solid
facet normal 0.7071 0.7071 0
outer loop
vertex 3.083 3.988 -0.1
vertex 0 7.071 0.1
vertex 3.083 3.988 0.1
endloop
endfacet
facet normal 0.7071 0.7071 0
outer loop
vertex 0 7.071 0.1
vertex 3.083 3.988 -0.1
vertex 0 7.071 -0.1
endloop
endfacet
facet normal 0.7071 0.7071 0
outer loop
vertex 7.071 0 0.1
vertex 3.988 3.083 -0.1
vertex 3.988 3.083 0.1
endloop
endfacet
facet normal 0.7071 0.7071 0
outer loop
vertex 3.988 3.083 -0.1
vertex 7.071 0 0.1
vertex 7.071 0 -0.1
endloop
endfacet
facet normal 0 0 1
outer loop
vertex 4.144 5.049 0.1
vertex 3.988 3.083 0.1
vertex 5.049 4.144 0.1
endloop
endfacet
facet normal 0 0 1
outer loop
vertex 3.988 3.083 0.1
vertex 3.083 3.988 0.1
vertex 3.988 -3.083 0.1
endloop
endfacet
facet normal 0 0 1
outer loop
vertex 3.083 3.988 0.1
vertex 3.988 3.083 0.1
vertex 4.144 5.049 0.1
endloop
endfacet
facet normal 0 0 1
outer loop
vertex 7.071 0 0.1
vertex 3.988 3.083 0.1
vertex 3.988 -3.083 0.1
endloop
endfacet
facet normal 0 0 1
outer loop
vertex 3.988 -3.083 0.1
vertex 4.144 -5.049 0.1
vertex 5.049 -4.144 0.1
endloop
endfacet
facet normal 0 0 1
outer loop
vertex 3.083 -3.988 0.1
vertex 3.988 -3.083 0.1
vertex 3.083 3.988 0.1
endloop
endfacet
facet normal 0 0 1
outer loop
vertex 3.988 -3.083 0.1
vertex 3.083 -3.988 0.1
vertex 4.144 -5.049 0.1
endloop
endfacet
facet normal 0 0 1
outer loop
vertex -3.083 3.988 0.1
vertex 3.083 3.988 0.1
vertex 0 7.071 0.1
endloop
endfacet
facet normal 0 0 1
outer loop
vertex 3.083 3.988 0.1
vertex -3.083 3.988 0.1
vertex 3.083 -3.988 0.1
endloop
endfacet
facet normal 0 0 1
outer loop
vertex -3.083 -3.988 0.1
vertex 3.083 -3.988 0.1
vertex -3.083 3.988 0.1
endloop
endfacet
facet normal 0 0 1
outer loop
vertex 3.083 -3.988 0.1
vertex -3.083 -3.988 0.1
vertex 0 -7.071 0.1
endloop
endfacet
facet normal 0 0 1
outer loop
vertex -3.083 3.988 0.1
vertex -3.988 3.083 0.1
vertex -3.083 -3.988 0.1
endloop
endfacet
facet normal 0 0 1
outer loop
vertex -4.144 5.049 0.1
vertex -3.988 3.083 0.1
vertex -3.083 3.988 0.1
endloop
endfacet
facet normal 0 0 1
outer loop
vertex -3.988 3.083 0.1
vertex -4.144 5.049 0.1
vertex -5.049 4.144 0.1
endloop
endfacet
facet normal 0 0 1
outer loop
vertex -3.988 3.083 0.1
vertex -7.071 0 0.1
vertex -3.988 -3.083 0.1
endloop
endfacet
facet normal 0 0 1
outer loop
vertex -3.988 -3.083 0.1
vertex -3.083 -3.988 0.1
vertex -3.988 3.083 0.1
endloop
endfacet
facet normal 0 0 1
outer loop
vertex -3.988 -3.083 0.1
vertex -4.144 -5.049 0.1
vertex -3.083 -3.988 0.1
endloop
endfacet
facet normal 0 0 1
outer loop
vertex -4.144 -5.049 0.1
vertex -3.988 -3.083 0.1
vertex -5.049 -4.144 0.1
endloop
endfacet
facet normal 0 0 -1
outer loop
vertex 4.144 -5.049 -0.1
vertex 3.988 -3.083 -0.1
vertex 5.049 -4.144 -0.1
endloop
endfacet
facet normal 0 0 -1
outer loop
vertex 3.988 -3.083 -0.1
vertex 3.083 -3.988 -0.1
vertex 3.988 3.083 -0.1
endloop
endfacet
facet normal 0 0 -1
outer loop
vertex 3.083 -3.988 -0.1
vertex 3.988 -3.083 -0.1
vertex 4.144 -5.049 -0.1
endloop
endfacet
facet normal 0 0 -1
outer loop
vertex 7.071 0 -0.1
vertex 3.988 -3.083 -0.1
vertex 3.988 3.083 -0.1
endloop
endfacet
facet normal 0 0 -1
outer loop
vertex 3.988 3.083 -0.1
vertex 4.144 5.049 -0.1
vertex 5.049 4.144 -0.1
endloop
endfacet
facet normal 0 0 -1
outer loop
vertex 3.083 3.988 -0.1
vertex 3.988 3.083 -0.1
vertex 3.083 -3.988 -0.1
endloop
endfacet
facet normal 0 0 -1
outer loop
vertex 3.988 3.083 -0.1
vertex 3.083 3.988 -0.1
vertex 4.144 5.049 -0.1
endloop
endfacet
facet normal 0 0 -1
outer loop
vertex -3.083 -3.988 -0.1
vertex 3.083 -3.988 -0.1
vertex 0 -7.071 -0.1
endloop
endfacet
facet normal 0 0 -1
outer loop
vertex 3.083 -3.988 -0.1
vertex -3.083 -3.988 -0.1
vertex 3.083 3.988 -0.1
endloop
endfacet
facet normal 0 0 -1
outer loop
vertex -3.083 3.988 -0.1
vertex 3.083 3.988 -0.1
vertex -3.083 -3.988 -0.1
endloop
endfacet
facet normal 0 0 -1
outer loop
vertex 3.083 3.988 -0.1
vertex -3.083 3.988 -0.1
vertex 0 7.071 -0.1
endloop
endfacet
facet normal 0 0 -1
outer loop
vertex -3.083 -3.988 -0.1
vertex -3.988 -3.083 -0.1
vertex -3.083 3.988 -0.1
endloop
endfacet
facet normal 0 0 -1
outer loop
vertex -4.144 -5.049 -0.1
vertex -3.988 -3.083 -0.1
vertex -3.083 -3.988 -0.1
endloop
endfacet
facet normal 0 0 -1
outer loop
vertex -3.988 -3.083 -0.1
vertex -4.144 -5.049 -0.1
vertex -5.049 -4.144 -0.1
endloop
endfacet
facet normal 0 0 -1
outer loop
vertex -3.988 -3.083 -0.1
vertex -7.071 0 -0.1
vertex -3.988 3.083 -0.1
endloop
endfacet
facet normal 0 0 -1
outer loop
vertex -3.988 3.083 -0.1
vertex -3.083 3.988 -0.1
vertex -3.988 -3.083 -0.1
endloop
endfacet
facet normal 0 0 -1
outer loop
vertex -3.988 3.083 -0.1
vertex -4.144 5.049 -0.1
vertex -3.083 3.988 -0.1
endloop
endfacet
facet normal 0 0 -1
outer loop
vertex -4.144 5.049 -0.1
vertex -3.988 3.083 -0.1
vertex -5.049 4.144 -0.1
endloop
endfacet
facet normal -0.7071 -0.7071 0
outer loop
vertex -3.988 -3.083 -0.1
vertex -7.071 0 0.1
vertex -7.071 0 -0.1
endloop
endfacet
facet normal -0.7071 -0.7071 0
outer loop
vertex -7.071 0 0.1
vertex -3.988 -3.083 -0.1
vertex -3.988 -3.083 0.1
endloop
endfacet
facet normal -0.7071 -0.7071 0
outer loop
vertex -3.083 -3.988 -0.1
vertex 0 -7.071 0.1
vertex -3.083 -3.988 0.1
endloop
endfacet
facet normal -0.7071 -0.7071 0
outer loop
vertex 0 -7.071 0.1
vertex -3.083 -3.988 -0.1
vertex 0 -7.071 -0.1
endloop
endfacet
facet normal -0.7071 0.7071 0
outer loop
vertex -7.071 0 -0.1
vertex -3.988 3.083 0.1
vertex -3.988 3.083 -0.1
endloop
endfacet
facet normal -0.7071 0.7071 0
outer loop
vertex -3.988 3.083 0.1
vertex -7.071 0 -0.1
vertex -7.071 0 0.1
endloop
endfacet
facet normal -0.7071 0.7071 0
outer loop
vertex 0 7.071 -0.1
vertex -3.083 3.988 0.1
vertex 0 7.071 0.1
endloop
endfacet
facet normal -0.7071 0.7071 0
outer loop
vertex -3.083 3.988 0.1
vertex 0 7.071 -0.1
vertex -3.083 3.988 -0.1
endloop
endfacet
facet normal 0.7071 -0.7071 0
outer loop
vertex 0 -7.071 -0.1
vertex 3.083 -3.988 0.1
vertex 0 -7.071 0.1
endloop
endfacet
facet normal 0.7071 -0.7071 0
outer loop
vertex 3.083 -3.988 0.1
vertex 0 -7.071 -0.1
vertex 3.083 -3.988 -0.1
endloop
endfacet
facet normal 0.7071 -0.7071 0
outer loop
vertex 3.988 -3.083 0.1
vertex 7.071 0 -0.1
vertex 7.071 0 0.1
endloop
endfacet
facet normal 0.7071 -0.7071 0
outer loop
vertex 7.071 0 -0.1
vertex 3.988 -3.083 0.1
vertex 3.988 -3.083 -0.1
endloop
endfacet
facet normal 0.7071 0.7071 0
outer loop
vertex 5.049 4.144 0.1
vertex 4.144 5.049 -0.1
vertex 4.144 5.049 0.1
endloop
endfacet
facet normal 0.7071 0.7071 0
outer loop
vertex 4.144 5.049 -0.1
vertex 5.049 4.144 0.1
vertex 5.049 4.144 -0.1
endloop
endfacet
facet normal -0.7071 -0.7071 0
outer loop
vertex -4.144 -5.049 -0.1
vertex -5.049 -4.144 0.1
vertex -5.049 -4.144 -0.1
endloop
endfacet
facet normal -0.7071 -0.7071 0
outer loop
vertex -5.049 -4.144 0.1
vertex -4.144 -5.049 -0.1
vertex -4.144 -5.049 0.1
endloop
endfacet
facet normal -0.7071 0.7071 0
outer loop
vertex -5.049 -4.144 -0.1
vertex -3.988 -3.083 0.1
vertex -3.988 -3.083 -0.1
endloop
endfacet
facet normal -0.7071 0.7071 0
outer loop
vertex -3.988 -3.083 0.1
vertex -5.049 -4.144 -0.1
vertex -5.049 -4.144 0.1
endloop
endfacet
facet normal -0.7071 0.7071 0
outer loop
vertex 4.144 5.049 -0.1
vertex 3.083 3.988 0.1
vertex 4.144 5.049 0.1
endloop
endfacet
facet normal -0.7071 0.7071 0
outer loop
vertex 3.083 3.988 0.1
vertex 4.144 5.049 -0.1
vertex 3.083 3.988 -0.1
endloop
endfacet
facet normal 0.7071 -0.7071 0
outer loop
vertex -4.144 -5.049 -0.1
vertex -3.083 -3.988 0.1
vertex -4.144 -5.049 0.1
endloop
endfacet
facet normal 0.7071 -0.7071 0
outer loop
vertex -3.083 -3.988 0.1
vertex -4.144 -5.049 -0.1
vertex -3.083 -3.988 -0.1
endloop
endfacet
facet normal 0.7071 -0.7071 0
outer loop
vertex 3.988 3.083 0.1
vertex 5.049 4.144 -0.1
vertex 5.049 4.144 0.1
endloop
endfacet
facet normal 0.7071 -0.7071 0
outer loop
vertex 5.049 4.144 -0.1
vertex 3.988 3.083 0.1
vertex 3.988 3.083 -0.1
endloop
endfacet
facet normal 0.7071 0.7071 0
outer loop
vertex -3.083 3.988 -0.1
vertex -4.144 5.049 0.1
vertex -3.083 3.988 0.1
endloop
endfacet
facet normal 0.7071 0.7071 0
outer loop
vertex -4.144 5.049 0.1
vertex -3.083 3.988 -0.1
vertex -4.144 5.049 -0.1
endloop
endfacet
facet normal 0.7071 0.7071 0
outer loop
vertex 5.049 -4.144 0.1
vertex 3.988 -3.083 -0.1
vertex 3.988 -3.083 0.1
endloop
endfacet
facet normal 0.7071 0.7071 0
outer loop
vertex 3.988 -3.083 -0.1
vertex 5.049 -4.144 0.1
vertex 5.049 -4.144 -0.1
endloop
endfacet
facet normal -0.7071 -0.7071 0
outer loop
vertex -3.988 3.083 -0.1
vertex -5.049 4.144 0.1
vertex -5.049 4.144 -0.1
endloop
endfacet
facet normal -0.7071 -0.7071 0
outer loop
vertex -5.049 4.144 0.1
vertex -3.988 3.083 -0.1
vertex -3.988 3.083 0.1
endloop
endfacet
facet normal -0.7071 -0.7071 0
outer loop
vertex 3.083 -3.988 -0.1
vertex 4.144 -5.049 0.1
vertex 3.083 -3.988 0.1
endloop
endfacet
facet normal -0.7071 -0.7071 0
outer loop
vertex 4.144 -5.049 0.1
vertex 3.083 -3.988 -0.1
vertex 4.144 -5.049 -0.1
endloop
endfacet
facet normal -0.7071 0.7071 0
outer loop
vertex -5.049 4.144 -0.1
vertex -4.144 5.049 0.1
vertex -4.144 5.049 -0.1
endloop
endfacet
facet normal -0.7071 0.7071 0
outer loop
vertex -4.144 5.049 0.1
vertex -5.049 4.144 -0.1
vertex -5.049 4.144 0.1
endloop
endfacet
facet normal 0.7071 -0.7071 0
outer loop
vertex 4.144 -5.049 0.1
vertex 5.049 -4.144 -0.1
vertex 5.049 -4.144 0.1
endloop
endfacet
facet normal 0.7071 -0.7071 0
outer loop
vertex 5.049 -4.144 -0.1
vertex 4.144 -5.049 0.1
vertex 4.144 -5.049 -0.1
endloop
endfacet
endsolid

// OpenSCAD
side_length = 10;
first_layer_height =.2;
thin_wall_thickness=1.28;
stick_out = 3;

rotate(45){
    cube([side_length, side_length, first_layer_height], center=true);
    cube([side_length+stick_out, thin_wall_thickness, first_layer_height], center=true);
    cube([thin_wall_thickness, side_length+stick_out,first_layer_height], center=true);
}
